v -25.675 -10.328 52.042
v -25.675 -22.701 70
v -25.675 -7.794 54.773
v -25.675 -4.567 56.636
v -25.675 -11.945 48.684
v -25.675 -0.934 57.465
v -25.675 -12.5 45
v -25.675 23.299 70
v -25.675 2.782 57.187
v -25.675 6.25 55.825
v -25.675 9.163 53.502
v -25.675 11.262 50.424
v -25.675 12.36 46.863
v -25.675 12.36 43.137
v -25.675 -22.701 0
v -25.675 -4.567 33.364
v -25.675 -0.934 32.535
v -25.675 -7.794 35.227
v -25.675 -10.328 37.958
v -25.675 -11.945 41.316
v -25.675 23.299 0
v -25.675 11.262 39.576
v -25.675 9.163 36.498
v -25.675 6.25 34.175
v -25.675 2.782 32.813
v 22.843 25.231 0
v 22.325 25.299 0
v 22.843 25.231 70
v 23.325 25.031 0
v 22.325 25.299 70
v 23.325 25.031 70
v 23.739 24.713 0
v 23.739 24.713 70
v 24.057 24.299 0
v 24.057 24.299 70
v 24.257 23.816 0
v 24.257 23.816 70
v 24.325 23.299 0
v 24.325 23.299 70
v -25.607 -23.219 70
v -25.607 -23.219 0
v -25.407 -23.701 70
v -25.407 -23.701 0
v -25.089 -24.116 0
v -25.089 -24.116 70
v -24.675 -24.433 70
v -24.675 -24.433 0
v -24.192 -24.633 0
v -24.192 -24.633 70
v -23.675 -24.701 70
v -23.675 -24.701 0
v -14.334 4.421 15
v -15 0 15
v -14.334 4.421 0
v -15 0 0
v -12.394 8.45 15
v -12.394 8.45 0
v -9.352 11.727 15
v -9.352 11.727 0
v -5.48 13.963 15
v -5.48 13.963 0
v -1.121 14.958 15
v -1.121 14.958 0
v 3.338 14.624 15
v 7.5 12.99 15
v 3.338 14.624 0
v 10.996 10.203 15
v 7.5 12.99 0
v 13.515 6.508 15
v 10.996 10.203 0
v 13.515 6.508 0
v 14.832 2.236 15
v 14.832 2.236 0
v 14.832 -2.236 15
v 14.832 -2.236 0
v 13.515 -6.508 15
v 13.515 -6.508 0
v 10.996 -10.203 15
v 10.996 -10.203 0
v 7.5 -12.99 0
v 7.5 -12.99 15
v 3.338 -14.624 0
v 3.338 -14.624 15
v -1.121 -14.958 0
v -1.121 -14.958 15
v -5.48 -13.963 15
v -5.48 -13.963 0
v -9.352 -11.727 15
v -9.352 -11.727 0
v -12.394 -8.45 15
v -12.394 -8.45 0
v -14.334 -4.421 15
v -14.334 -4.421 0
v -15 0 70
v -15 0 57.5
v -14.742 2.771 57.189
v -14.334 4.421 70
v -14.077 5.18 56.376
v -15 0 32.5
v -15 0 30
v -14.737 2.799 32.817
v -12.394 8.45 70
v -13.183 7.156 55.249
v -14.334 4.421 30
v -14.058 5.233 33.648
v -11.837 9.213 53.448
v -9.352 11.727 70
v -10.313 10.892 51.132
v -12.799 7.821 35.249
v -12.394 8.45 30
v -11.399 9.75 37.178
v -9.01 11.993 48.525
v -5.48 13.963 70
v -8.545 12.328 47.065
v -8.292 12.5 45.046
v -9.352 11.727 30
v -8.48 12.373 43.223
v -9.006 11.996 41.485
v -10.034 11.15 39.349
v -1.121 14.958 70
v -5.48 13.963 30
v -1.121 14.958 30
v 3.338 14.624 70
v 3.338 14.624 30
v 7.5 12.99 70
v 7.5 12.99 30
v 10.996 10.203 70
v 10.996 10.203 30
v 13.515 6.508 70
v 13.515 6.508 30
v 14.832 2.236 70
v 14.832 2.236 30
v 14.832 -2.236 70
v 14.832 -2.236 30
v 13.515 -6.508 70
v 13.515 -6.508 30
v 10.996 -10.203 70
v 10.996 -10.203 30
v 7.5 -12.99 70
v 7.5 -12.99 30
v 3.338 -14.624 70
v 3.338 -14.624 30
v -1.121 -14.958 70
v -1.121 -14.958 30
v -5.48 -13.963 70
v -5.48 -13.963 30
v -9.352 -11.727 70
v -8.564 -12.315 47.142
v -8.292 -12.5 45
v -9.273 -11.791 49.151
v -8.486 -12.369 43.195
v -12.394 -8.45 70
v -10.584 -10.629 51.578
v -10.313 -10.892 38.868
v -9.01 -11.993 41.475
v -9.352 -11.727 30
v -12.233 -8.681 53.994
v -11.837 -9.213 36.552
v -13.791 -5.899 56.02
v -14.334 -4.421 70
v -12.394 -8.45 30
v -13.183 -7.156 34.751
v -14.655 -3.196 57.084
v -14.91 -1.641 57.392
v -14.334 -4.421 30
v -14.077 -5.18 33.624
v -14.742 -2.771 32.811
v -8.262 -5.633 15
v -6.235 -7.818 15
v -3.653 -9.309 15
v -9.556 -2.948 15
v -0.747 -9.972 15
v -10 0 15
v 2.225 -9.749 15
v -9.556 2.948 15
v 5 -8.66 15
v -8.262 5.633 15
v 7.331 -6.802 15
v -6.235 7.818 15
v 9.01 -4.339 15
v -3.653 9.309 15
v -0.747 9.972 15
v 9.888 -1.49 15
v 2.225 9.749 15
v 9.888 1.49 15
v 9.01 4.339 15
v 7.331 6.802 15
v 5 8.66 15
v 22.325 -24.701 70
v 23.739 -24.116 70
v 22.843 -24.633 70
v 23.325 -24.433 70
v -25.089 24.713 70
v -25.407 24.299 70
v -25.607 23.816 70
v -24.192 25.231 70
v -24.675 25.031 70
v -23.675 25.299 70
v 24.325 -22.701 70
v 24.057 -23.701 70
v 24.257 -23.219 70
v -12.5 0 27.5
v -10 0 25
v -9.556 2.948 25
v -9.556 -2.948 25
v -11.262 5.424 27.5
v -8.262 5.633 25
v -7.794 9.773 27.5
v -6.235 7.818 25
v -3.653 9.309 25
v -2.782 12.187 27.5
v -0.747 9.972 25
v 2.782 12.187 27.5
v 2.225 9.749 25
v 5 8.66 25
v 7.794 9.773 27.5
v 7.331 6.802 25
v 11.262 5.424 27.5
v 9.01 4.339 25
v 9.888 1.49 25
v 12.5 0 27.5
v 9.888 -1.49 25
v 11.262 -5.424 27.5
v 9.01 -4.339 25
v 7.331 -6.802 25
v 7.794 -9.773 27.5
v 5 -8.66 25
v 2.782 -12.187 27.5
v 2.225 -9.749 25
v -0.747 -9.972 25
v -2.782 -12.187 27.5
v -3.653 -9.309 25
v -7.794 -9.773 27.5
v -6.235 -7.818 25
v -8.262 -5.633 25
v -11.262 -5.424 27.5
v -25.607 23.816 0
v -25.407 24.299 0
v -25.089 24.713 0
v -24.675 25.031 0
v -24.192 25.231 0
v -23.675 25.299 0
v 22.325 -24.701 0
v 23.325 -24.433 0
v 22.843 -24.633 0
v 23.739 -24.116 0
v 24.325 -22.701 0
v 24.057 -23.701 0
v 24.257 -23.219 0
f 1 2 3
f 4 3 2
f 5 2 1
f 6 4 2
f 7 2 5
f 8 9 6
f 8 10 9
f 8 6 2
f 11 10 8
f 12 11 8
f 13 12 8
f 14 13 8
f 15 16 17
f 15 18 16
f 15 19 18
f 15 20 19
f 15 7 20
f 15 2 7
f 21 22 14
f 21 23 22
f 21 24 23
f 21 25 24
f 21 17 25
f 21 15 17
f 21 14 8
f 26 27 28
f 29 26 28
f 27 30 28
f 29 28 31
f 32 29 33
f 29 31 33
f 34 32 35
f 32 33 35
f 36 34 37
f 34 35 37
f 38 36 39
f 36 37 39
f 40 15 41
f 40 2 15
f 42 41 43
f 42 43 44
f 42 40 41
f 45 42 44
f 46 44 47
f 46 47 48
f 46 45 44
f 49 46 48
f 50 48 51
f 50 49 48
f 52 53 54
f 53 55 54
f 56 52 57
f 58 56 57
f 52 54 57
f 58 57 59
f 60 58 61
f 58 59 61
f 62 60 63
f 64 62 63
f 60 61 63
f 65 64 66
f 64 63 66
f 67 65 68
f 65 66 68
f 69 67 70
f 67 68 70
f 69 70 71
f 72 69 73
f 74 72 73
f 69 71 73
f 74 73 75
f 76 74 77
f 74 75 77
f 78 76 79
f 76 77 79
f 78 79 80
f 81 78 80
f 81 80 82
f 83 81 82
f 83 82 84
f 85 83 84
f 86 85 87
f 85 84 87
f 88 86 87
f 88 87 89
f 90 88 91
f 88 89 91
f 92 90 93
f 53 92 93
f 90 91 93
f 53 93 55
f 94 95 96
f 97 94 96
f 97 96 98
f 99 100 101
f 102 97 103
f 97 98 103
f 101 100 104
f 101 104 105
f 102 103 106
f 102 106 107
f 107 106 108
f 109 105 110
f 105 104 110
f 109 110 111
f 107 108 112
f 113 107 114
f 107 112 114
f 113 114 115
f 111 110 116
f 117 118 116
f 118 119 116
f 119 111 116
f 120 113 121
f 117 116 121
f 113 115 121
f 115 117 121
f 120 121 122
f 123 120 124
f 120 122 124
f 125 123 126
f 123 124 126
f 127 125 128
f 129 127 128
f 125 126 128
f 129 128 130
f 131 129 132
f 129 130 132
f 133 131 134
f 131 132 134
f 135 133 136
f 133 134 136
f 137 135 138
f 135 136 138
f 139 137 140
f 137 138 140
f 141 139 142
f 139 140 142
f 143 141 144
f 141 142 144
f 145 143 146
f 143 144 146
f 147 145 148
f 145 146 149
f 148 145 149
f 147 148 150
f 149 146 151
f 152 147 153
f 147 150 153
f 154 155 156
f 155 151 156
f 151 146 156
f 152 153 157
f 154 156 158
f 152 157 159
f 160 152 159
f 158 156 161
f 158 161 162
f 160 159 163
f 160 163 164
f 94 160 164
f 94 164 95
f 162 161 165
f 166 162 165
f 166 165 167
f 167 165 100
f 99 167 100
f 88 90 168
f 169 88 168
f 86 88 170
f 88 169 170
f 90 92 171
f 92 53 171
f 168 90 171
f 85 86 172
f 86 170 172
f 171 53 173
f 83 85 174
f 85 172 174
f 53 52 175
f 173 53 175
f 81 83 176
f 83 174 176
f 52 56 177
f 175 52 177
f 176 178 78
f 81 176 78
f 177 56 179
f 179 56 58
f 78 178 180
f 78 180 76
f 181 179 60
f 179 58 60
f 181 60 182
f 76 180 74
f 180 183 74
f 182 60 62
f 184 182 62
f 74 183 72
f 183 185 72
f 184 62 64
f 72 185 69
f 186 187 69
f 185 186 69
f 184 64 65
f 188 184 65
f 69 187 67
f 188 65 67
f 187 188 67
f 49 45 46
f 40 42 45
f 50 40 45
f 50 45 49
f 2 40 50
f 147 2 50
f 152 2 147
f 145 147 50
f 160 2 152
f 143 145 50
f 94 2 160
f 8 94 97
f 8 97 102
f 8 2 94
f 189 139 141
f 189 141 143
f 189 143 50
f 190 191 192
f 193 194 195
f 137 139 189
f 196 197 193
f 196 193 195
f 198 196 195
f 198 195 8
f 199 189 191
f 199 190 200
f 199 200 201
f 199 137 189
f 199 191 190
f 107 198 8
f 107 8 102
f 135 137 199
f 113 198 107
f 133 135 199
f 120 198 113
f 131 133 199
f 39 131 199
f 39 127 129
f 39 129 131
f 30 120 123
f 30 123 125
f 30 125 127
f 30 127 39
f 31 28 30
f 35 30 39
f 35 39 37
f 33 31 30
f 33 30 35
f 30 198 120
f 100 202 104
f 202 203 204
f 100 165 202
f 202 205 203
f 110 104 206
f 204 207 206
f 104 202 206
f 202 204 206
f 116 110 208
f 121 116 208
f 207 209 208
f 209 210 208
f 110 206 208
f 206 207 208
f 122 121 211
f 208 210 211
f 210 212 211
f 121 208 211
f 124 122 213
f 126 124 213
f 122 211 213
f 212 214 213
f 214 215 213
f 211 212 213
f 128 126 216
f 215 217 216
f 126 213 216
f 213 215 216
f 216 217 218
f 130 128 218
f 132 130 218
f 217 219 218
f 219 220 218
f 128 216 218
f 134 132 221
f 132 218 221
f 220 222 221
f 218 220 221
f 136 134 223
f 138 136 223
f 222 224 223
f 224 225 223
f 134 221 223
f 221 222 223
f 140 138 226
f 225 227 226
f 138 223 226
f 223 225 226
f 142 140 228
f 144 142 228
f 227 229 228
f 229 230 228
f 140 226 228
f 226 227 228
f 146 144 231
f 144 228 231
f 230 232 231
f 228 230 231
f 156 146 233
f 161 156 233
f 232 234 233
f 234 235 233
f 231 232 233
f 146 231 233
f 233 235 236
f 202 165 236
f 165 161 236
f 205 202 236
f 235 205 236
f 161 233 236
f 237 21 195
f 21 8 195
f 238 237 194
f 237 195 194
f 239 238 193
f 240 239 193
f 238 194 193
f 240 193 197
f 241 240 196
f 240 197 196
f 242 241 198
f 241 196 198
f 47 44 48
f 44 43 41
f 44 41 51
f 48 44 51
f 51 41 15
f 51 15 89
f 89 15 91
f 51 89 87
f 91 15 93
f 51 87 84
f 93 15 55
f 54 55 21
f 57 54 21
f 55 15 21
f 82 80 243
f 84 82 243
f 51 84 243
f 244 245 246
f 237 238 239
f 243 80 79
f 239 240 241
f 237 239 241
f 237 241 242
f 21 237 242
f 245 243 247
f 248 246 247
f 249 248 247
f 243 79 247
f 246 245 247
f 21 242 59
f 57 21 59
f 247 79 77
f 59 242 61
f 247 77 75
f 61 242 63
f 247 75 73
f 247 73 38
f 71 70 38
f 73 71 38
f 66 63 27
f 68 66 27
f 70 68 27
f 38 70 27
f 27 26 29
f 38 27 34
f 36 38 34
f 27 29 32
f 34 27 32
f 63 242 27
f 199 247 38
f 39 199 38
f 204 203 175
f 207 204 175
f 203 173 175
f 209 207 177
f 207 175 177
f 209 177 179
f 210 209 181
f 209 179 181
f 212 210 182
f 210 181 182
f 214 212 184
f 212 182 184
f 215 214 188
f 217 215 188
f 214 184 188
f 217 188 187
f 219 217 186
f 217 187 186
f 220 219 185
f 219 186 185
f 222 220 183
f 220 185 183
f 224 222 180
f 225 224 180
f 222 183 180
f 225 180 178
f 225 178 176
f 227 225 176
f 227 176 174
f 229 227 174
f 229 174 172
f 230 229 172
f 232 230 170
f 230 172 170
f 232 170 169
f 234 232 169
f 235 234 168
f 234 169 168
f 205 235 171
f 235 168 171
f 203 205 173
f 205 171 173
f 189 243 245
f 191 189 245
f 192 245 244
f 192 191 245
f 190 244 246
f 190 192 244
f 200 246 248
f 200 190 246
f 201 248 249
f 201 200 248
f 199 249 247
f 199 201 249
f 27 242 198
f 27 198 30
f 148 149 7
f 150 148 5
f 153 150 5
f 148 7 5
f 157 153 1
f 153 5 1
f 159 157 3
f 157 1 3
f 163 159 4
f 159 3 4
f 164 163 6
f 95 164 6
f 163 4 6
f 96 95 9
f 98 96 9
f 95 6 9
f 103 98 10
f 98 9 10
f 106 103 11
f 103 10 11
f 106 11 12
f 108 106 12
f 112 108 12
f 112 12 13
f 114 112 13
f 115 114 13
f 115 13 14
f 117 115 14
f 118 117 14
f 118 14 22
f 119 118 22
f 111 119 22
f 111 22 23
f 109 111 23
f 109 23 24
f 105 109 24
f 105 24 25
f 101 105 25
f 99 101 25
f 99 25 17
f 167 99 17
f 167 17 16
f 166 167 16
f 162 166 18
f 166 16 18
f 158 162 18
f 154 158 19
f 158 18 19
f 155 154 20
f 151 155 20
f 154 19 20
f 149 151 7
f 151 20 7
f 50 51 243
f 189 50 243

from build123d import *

# Parameters (mm, degrees)
F0_W     = 50
F0_H     = 50
F1_DEPTH = 70
F4_R     = 12.5
F5_DEPTH = 25
F6_R     = 2


with BuildPart() as f1:
    # F0 (on Top) → F1 (new body)
    with BuildSketch(Plane.XY):
        with Locations((-0.674803, 0.298673)):
            Rectangle(F0_W, F0_H)
    extrude(amount=F1_DEPTH)

    # F2 (on Front) → F3 (revolve, cut)
    with BuildSketch(Plane.XZ):
        Polygon((0, 70), (-15, 70), (-15, 30), (-10, 25), (-10, 15), (-15, 15), (-15, 0), (0, 0), align=None)
    revolve(axis=Axis((0, 0, 41.096286), (0, 0, -1)), mode=Mode.SUBTRACT)

    # F4 (on face) → F5 (cut)
    with BuildSketch(Plane(origin=(-25.674803, 0, 0), x_dir=(0, -1, 0), z_dir=(-1, 0, 0))):
        with Locations((0, 45)):
            Circle(F4_R)
    extrude(amount=-F5_DEPTH, mode=Mode.SUBTRACT)

    # F6
    f6_edges = [f1.edges().sort_by_distance(p)[0] for p in [
        (-25.674803, 25.298673, 35),
        (24.325197, 25.298673, 35),
        (24.325197, -24.701327, 35),
        (-25.674803, -24.701327, 35),
    ]]
    fillet(f6_edges, radius=F6_R)


solid = f1.part
